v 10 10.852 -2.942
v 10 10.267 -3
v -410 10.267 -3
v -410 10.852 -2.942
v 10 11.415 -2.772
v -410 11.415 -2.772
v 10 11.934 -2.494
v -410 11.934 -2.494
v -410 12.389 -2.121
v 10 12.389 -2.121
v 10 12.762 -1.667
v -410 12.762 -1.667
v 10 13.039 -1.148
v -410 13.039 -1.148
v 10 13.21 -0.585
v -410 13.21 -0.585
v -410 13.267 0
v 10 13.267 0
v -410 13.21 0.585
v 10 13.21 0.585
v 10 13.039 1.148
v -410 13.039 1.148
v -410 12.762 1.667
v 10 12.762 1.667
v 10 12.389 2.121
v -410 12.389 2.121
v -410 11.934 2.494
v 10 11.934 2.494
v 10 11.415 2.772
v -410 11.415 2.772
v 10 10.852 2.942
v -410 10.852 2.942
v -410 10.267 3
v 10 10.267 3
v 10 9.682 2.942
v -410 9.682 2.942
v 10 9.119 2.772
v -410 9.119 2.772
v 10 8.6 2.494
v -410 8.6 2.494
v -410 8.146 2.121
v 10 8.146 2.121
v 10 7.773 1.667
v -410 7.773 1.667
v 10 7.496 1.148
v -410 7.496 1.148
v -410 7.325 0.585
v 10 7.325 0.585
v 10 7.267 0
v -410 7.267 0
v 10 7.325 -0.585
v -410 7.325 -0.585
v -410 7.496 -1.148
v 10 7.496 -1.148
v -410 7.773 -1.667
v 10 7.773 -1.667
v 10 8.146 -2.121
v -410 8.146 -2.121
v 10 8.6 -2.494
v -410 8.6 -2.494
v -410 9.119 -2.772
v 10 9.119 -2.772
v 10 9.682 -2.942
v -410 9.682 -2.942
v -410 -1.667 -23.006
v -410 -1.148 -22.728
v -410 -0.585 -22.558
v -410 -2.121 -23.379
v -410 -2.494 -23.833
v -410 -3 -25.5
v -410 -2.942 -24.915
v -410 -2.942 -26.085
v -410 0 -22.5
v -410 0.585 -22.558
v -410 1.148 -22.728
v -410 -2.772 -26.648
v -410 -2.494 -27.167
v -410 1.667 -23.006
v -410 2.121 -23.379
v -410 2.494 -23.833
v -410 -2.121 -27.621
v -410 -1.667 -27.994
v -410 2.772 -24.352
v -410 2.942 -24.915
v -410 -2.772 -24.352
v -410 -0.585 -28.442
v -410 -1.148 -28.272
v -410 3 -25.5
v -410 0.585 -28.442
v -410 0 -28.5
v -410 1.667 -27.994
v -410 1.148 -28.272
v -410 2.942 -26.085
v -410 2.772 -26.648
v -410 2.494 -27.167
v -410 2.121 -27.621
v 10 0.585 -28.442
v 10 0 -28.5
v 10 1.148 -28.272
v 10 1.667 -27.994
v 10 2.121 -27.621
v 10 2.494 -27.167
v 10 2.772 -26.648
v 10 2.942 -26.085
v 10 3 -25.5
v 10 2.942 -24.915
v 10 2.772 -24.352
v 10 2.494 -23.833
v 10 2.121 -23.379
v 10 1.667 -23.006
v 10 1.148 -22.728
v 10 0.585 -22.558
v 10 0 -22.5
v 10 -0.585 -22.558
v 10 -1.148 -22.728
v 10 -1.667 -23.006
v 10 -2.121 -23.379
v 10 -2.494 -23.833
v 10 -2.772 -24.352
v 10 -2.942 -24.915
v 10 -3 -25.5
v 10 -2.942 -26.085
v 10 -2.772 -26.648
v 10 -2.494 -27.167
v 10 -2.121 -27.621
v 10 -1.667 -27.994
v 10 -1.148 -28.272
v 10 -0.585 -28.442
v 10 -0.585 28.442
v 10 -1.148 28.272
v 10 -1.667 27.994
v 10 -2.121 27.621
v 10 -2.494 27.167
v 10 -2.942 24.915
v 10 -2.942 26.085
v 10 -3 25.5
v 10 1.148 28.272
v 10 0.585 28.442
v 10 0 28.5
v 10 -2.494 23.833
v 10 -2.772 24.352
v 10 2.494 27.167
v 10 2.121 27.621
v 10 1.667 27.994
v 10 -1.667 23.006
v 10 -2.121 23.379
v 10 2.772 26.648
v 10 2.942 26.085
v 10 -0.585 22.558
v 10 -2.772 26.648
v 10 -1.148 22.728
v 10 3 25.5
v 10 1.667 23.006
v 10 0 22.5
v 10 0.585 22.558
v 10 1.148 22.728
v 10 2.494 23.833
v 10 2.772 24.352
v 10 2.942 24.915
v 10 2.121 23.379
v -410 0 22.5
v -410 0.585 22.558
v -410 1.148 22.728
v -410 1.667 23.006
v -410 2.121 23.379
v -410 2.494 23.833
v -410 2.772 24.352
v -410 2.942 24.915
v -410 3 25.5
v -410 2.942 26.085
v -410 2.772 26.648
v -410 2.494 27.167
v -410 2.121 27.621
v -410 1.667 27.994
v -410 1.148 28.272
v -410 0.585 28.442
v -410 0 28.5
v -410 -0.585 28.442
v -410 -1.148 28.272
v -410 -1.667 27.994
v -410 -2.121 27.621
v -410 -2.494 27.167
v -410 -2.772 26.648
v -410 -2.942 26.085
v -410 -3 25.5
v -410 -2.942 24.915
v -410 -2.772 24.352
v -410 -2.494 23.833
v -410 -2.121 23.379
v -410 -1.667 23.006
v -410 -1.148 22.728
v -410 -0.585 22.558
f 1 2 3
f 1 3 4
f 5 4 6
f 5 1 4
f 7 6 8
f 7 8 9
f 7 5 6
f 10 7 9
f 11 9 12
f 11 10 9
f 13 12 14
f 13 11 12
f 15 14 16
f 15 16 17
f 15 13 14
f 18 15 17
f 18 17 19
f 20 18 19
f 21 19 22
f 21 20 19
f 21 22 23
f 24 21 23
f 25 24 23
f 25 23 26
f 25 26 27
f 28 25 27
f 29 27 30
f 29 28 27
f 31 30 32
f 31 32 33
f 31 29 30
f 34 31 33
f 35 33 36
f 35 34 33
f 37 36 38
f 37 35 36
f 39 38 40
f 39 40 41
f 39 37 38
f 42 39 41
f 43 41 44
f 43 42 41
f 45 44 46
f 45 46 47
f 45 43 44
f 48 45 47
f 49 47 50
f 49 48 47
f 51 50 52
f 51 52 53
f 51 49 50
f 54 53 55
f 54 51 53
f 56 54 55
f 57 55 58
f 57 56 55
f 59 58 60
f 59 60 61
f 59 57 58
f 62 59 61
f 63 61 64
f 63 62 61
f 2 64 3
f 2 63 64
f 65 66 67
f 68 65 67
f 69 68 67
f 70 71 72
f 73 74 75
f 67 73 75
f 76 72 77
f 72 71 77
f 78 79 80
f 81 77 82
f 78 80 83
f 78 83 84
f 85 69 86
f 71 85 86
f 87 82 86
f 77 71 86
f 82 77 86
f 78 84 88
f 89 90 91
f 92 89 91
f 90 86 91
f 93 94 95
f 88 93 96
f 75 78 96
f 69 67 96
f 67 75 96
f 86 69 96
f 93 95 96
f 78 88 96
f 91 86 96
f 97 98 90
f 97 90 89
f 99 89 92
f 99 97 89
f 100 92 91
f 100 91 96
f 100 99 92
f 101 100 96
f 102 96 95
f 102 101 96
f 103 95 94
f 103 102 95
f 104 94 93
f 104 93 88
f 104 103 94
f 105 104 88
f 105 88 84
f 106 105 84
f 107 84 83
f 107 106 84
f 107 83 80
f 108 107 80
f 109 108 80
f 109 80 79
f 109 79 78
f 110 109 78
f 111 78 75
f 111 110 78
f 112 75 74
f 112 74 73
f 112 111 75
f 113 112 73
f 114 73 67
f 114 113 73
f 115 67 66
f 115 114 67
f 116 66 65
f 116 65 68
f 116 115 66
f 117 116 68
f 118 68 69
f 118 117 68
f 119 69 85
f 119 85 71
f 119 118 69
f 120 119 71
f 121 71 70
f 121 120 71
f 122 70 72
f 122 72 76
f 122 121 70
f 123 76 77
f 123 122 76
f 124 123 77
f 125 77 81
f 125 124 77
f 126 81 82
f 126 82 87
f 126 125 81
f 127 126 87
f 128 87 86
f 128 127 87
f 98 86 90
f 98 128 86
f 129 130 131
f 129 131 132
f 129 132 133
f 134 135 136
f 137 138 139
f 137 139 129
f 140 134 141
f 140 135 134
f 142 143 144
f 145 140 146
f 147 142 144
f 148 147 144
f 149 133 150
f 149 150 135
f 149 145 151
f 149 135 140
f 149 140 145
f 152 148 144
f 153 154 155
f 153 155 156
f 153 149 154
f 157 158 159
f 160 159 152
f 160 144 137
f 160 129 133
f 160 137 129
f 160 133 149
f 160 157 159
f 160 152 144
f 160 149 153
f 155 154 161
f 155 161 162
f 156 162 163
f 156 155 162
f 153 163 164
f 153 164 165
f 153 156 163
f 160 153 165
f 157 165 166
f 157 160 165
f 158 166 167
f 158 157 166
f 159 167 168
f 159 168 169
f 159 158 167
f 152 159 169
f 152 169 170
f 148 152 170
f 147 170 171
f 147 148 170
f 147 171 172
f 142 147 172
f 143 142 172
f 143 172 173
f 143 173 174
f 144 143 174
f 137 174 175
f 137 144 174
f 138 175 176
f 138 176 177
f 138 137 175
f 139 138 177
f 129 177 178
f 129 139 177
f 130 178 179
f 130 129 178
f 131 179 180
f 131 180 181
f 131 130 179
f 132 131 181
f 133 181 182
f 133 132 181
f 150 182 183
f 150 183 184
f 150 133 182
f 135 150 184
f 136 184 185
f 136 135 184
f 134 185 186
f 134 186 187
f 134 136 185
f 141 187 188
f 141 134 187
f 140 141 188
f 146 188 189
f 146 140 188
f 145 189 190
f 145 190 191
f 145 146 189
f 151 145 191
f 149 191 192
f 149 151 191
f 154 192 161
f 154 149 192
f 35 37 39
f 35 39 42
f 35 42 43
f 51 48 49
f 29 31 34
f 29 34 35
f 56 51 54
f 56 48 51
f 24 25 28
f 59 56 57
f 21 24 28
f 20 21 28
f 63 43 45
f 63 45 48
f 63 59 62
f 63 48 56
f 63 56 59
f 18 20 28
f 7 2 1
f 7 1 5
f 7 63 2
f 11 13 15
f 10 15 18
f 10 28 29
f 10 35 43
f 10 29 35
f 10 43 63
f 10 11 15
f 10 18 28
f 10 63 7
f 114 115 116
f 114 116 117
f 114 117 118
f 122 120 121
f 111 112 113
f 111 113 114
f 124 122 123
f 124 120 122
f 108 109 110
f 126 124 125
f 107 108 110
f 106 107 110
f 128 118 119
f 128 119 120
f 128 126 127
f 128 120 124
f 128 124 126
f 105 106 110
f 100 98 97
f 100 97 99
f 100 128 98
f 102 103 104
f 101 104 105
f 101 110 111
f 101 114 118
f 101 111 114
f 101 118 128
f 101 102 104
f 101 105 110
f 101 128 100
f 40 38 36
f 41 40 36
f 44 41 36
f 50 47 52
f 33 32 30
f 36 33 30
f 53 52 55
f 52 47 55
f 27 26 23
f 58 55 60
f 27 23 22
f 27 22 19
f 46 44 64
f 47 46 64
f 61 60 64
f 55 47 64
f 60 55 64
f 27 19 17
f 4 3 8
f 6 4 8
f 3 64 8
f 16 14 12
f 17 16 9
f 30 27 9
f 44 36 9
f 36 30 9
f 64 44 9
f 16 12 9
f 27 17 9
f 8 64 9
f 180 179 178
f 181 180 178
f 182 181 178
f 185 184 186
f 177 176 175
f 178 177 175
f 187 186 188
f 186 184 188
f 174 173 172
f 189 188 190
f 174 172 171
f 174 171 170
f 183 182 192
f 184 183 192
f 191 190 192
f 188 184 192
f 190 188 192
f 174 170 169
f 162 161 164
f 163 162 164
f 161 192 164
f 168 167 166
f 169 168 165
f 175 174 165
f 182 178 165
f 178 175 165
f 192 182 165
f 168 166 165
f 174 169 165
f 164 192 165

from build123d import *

# Parameters (mm, degrees)
BOSS_EXTRUDE1_START   = 10
SKETCH2_R             = 3
BOSS_EXTRUDE1_DEPTH   = 420
BOSS_EXTRUDE1_2_DEPTH = 420
BOSS_EXTRUDE1_3_DEPTH = 420


with BuildPart() as part:
    # Sketch2 → Boss-Extrude1 (new body)
    with BuildSketch(Plane(origin=(0, 0, 0), x_dir=(0, 0, -1), z_dir=(1, 0, 0)).offset(BOSS_EXTRUDE1_START)):
        with Locations((25.5, 0)):
            Circle(SKETCH2_R)
    extrude(amount=-BOSS_EXTRUDE1_DEPTH)


with BuildPart() as body_2:
    # Sketch2 → Boss-Extrude1 2 (new body)
    with BuildSketch(Plane(origin=(0, 0, 0), x_dir=(0, 0, -1), z_dir=(1, 0, 0)).offset(BOSS_EXTRUDE1_START)):
        with Locations((0, 10.267190122)):
            Circle(SKETCH2_R)
    extrude(amount=-BOSS_EXTRUDE1_2_DEPTH)


with BuildPart() as body_3:
    # Sketch2 → Boss-Extrude1 3 (new body)
    with BuildSketch(Plane(origin=(0, 0, 0), x_dir=(0, 0, -1), z_dir=(1, 0, 0)).offset(BOSS_EXTRUDE1_START)):
        with Locations((-25.5, 0)):
            Circle(SKETCH2_R)
    extrude(amount=-BOSS_EXTRUDE1_3_DEPTH)


solid = Compound([part.part, body_2.part, body_3.part])
